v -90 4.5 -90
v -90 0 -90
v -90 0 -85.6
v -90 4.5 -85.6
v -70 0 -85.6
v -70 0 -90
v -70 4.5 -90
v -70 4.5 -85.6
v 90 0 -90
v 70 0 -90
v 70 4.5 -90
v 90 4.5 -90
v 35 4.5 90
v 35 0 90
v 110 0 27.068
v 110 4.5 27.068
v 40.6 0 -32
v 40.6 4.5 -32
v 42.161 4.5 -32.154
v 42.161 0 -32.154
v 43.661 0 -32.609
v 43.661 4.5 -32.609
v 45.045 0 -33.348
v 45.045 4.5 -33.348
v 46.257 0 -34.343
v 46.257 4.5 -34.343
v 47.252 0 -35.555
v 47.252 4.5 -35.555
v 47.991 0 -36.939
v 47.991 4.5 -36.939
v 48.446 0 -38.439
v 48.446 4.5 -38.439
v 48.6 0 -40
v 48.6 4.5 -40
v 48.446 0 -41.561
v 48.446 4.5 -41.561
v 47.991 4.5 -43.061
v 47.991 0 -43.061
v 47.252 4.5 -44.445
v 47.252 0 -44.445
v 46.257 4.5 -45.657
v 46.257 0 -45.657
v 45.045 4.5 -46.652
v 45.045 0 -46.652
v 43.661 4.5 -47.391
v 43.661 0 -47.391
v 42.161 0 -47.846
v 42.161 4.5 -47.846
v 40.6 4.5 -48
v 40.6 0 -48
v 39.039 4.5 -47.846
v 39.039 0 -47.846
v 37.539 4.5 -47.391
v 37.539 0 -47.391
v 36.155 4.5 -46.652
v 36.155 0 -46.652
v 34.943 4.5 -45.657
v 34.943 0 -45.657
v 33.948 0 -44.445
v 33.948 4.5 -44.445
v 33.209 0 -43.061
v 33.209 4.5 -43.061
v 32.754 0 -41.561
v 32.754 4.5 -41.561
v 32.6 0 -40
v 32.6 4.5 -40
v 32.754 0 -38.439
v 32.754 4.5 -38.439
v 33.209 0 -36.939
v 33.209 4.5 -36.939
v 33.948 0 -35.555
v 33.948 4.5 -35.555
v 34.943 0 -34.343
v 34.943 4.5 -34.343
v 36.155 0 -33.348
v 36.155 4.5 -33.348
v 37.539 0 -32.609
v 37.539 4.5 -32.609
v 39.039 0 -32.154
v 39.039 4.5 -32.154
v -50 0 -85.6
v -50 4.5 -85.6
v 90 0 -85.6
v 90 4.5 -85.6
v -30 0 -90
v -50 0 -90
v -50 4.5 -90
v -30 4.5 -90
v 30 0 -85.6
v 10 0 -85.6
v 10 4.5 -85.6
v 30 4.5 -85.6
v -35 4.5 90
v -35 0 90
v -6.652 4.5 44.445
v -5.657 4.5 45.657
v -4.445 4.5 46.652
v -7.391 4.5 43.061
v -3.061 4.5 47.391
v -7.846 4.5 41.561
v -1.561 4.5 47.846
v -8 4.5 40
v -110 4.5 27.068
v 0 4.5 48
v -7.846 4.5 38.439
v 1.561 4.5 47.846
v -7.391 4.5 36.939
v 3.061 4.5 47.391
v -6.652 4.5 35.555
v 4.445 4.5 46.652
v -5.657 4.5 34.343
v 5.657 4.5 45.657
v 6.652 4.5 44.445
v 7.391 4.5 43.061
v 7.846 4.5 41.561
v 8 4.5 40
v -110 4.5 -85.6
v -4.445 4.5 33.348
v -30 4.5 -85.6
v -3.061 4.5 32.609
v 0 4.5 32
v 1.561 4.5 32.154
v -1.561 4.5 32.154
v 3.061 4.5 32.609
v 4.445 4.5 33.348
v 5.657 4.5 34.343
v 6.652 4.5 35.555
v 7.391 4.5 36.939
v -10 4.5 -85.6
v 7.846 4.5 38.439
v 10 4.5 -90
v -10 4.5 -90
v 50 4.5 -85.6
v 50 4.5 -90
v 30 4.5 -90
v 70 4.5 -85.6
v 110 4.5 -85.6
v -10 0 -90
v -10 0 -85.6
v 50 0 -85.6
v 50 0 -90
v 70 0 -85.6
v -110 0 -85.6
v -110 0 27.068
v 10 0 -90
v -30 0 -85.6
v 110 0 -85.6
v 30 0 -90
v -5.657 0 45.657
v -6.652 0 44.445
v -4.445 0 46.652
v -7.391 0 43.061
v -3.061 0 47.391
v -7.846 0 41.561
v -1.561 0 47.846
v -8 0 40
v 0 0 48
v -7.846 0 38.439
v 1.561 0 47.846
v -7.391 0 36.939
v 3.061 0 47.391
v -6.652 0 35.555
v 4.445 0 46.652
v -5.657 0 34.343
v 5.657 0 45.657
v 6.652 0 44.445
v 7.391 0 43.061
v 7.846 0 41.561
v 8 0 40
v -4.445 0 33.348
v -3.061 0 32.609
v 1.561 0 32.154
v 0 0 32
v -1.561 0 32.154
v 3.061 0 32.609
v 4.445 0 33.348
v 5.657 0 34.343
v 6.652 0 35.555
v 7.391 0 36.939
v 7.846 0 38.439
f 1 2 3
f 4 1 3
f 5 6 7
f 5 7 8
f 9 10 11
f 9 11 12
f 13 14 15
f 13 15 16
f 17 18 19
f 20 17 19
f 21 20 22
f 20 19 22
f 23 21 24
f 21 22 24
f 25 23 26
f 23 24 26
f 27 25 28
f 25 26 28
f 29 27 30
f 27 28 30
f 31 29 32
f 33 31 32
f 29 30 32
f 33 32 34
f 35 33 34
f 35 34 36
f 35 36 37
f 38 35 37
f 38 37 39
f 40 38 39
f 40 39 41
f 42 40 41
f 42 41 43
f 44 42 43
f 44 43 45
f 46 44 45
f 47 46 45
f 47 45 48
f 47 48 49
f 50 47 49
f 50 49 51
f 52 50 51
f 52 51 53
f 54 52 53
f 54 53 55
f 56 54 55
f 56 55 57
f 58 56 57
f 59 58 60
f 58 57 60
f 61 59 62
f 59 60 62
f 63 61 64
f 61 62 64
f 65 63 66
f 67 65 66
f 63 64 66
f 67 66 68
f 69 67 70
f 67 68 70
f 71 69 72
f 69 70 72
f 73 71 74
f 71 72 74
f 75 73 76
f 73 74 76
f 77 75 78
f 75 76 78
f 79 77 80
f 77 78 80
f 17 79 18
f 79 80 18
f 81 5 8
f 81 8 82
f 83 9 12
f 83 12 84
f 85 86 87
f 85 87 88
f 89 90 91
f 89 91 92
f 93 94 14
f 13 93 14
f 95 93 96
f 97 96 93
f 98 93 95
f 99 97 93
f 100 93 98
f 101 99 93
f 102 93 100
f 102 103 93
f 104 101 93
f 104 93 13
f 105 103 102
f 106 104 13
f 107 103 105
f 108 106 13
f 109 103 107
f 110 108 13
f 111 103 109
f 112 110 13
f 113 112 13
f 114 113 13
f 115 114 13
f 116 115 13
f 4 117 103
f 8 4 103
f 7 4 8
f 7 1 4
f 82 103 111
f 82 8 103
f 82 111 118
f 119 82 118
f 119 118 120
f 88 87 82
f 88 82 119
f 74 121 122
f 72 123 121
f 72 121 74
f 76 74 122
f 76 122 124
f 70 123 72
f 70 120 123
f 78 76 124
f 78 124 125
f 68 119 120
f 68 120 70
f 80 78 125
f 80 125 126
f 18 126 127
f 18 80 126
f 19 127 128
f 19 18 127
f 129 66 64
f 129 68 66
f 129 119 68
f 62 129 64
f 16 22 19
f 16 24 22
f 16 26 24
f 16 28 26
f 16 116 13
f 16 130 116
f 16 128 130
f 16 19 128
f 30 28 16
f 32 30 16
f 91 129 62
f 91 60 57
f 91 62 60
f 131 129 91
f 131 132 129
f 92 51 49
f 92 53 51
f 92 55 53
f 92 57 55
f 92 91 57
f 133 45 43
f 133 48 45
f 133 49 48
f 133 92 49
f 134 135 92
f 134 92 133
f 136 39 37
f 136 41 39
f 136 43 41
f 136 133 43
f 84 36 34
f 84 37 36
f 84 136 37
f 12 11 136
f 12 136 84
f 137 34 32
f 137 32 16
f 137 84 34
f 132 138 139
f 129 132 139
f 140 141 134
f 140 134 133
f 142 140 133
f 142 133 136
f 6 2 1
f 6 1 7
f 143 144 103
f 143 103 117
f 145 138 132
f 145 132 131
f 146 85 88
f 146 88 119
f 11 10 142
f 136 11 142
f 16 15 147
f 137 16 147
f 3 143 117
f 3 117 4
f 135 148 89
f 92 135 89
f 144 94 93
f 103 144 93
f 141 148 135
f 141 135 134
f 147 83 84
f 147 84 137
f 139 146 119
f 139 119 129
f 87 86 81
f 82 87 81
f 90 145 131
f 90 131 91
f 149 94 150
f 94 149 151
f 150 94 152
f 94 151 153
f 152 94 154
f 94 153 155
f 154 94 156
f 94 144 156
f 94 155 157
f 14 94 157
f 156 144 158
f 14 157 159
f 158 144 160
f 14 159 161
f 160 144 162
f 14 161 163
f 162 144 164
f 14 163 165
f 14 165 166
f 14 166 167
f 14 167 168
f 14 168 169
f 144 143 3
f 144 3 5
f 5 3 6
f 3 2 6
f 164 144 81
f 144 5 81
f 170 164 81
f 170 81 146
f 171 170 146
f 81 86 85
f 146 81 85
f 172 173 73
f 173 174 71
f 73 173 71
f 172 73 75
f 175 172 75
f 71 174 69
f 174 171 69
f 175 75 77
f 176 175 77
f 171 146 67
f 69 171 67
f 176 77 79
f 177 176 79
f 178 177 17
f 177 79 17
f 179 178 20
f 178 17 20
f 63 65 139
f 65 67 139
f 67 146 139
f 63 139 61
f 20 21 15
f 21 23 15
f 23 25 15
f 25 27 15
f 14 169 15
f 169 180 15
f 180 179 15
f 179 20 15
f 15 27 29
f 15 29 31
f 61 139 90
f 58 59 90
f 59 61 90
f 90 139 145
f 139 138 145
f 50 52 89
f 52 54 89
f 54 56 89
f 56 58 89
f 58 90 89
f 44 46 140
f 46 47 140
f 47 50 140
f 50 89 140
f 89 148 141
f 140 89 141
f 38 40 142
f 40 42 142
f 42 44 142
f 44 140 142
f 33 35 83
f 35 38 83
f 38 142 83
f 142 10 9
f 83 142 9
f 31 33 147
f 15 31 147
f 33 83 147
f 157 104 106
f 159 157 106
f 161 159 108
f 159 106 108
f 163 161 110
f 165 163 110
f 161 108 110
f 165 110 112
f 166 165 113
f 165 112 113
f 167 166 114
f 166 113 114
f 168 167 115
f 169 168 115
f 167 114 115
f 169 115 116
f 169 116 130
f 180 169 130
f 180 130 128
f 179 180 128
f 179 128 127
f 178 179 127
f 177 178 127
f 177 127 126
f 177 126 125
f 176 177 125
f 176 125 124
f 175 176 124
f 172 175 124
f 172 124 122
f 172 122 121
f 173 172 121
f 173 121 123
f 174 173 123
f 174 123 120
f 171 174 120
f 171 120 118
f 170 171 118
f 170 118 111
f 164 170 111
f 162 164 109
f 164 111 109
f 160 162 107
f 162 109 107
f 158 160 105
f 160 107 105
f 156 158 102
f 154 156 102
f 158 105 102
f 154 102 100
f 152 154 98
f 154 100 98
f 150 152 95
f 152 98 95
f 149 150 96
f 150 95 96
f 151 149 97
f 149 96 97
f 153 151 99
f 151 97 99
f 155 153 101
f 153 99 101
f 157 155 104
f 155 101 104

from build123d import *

# Parameters (mm, degrees)
SKETCH2_W           = 220
SKETCH2_H           = 180
BOSS_EXTRUDE1_DEPTH = 4.5
CHAMFER1_SIZE       = 75
CHAMFER1_SIZE2      = 62.932472338
SKETCH3_R           = 8
CUT_EXTRUDE1_DEPTH  = 143.197925442
SKETCH4_W           = 20
SKETCH4_H           = 4.4
CUT_EXTRUDE2_DEPTH  = 143.197925442


with BuildPart() as part:
    # Sketch2 → Boss-Extrude1 (new body)
    with BuildSketch(Plane(origin=(0, 0, 0), x_dir=(1, 0, 0), z_dir=(0, 1, 0))):
        Rectangle(SKETCH2_W, SKETCH2_H)
    extrude(amount=BOSS_EXTRUDE1_DEPTH)

    # Chamfer1
    chamfer1_edges = [part.edges().sort_by_distance(p)[0] for p in [
        (110, 2.25, 90),
        (-110, 2.25, 90),
    ]]
    chamfer1_side = [part.faces().sort_by_distance(p)[0] for p in [
        (0, 2.25, 90),
    ]]
    chamfer(chamfer1_edges, length=CHAMFER1_SIZE, length2=CHAMFER1_SIZE2, reference=chamfer1_side[0])

    # Sketch3 → Cut-Extrude1 (cut, through all)
    with BuildSketch(Plane(origin=(0, 4.5, 0), x_dir=(1, 0, 0), z_dir=(0, 1, 0))):
        with Locations(Location((0, -40, 0), (0, 0, 270))):
            Circle(SKETCH3_R)
        with Locations(Location((40.6, 40, 0), (0, 0, 270))):
            Circle(SKETCH3_R)
    extrude(amount=-CUT_EXTRUDE1_DEPTH, mode=Mode.SUBTRACT)

    # Sketch4 → Cut-Extrude2 (cut, through all)
    with BuildSketch(Plane.XZ):
        with Locations((100, -87.8)):
            Rectangle(SKETCH4_W, SKETCH4_H)
        with Locations((60, -87.8)):
            Rectangle(SKETCH4_W, SKETCH4_H)
        with Locations((20, -87.8)):
            Rectangle(SKETCH4_W, SKETCH4_H)
        with Locations((-20, -87.8)):
            Rectangle(SKETCH4_W, SKETCH4_H)
        with Locations((-60, -87.8)):
            Rectangle(SKETCH4_W, SKETCH4_H)
        with Locations((-100, -87.8)):
            Rectangle(SKETCH4_W, SKETCH4_H)
    extrude(amount=-CUT_EXTRUDE2_DEPTH, mode=Mode.SUBTRACT)


solid = part.part
